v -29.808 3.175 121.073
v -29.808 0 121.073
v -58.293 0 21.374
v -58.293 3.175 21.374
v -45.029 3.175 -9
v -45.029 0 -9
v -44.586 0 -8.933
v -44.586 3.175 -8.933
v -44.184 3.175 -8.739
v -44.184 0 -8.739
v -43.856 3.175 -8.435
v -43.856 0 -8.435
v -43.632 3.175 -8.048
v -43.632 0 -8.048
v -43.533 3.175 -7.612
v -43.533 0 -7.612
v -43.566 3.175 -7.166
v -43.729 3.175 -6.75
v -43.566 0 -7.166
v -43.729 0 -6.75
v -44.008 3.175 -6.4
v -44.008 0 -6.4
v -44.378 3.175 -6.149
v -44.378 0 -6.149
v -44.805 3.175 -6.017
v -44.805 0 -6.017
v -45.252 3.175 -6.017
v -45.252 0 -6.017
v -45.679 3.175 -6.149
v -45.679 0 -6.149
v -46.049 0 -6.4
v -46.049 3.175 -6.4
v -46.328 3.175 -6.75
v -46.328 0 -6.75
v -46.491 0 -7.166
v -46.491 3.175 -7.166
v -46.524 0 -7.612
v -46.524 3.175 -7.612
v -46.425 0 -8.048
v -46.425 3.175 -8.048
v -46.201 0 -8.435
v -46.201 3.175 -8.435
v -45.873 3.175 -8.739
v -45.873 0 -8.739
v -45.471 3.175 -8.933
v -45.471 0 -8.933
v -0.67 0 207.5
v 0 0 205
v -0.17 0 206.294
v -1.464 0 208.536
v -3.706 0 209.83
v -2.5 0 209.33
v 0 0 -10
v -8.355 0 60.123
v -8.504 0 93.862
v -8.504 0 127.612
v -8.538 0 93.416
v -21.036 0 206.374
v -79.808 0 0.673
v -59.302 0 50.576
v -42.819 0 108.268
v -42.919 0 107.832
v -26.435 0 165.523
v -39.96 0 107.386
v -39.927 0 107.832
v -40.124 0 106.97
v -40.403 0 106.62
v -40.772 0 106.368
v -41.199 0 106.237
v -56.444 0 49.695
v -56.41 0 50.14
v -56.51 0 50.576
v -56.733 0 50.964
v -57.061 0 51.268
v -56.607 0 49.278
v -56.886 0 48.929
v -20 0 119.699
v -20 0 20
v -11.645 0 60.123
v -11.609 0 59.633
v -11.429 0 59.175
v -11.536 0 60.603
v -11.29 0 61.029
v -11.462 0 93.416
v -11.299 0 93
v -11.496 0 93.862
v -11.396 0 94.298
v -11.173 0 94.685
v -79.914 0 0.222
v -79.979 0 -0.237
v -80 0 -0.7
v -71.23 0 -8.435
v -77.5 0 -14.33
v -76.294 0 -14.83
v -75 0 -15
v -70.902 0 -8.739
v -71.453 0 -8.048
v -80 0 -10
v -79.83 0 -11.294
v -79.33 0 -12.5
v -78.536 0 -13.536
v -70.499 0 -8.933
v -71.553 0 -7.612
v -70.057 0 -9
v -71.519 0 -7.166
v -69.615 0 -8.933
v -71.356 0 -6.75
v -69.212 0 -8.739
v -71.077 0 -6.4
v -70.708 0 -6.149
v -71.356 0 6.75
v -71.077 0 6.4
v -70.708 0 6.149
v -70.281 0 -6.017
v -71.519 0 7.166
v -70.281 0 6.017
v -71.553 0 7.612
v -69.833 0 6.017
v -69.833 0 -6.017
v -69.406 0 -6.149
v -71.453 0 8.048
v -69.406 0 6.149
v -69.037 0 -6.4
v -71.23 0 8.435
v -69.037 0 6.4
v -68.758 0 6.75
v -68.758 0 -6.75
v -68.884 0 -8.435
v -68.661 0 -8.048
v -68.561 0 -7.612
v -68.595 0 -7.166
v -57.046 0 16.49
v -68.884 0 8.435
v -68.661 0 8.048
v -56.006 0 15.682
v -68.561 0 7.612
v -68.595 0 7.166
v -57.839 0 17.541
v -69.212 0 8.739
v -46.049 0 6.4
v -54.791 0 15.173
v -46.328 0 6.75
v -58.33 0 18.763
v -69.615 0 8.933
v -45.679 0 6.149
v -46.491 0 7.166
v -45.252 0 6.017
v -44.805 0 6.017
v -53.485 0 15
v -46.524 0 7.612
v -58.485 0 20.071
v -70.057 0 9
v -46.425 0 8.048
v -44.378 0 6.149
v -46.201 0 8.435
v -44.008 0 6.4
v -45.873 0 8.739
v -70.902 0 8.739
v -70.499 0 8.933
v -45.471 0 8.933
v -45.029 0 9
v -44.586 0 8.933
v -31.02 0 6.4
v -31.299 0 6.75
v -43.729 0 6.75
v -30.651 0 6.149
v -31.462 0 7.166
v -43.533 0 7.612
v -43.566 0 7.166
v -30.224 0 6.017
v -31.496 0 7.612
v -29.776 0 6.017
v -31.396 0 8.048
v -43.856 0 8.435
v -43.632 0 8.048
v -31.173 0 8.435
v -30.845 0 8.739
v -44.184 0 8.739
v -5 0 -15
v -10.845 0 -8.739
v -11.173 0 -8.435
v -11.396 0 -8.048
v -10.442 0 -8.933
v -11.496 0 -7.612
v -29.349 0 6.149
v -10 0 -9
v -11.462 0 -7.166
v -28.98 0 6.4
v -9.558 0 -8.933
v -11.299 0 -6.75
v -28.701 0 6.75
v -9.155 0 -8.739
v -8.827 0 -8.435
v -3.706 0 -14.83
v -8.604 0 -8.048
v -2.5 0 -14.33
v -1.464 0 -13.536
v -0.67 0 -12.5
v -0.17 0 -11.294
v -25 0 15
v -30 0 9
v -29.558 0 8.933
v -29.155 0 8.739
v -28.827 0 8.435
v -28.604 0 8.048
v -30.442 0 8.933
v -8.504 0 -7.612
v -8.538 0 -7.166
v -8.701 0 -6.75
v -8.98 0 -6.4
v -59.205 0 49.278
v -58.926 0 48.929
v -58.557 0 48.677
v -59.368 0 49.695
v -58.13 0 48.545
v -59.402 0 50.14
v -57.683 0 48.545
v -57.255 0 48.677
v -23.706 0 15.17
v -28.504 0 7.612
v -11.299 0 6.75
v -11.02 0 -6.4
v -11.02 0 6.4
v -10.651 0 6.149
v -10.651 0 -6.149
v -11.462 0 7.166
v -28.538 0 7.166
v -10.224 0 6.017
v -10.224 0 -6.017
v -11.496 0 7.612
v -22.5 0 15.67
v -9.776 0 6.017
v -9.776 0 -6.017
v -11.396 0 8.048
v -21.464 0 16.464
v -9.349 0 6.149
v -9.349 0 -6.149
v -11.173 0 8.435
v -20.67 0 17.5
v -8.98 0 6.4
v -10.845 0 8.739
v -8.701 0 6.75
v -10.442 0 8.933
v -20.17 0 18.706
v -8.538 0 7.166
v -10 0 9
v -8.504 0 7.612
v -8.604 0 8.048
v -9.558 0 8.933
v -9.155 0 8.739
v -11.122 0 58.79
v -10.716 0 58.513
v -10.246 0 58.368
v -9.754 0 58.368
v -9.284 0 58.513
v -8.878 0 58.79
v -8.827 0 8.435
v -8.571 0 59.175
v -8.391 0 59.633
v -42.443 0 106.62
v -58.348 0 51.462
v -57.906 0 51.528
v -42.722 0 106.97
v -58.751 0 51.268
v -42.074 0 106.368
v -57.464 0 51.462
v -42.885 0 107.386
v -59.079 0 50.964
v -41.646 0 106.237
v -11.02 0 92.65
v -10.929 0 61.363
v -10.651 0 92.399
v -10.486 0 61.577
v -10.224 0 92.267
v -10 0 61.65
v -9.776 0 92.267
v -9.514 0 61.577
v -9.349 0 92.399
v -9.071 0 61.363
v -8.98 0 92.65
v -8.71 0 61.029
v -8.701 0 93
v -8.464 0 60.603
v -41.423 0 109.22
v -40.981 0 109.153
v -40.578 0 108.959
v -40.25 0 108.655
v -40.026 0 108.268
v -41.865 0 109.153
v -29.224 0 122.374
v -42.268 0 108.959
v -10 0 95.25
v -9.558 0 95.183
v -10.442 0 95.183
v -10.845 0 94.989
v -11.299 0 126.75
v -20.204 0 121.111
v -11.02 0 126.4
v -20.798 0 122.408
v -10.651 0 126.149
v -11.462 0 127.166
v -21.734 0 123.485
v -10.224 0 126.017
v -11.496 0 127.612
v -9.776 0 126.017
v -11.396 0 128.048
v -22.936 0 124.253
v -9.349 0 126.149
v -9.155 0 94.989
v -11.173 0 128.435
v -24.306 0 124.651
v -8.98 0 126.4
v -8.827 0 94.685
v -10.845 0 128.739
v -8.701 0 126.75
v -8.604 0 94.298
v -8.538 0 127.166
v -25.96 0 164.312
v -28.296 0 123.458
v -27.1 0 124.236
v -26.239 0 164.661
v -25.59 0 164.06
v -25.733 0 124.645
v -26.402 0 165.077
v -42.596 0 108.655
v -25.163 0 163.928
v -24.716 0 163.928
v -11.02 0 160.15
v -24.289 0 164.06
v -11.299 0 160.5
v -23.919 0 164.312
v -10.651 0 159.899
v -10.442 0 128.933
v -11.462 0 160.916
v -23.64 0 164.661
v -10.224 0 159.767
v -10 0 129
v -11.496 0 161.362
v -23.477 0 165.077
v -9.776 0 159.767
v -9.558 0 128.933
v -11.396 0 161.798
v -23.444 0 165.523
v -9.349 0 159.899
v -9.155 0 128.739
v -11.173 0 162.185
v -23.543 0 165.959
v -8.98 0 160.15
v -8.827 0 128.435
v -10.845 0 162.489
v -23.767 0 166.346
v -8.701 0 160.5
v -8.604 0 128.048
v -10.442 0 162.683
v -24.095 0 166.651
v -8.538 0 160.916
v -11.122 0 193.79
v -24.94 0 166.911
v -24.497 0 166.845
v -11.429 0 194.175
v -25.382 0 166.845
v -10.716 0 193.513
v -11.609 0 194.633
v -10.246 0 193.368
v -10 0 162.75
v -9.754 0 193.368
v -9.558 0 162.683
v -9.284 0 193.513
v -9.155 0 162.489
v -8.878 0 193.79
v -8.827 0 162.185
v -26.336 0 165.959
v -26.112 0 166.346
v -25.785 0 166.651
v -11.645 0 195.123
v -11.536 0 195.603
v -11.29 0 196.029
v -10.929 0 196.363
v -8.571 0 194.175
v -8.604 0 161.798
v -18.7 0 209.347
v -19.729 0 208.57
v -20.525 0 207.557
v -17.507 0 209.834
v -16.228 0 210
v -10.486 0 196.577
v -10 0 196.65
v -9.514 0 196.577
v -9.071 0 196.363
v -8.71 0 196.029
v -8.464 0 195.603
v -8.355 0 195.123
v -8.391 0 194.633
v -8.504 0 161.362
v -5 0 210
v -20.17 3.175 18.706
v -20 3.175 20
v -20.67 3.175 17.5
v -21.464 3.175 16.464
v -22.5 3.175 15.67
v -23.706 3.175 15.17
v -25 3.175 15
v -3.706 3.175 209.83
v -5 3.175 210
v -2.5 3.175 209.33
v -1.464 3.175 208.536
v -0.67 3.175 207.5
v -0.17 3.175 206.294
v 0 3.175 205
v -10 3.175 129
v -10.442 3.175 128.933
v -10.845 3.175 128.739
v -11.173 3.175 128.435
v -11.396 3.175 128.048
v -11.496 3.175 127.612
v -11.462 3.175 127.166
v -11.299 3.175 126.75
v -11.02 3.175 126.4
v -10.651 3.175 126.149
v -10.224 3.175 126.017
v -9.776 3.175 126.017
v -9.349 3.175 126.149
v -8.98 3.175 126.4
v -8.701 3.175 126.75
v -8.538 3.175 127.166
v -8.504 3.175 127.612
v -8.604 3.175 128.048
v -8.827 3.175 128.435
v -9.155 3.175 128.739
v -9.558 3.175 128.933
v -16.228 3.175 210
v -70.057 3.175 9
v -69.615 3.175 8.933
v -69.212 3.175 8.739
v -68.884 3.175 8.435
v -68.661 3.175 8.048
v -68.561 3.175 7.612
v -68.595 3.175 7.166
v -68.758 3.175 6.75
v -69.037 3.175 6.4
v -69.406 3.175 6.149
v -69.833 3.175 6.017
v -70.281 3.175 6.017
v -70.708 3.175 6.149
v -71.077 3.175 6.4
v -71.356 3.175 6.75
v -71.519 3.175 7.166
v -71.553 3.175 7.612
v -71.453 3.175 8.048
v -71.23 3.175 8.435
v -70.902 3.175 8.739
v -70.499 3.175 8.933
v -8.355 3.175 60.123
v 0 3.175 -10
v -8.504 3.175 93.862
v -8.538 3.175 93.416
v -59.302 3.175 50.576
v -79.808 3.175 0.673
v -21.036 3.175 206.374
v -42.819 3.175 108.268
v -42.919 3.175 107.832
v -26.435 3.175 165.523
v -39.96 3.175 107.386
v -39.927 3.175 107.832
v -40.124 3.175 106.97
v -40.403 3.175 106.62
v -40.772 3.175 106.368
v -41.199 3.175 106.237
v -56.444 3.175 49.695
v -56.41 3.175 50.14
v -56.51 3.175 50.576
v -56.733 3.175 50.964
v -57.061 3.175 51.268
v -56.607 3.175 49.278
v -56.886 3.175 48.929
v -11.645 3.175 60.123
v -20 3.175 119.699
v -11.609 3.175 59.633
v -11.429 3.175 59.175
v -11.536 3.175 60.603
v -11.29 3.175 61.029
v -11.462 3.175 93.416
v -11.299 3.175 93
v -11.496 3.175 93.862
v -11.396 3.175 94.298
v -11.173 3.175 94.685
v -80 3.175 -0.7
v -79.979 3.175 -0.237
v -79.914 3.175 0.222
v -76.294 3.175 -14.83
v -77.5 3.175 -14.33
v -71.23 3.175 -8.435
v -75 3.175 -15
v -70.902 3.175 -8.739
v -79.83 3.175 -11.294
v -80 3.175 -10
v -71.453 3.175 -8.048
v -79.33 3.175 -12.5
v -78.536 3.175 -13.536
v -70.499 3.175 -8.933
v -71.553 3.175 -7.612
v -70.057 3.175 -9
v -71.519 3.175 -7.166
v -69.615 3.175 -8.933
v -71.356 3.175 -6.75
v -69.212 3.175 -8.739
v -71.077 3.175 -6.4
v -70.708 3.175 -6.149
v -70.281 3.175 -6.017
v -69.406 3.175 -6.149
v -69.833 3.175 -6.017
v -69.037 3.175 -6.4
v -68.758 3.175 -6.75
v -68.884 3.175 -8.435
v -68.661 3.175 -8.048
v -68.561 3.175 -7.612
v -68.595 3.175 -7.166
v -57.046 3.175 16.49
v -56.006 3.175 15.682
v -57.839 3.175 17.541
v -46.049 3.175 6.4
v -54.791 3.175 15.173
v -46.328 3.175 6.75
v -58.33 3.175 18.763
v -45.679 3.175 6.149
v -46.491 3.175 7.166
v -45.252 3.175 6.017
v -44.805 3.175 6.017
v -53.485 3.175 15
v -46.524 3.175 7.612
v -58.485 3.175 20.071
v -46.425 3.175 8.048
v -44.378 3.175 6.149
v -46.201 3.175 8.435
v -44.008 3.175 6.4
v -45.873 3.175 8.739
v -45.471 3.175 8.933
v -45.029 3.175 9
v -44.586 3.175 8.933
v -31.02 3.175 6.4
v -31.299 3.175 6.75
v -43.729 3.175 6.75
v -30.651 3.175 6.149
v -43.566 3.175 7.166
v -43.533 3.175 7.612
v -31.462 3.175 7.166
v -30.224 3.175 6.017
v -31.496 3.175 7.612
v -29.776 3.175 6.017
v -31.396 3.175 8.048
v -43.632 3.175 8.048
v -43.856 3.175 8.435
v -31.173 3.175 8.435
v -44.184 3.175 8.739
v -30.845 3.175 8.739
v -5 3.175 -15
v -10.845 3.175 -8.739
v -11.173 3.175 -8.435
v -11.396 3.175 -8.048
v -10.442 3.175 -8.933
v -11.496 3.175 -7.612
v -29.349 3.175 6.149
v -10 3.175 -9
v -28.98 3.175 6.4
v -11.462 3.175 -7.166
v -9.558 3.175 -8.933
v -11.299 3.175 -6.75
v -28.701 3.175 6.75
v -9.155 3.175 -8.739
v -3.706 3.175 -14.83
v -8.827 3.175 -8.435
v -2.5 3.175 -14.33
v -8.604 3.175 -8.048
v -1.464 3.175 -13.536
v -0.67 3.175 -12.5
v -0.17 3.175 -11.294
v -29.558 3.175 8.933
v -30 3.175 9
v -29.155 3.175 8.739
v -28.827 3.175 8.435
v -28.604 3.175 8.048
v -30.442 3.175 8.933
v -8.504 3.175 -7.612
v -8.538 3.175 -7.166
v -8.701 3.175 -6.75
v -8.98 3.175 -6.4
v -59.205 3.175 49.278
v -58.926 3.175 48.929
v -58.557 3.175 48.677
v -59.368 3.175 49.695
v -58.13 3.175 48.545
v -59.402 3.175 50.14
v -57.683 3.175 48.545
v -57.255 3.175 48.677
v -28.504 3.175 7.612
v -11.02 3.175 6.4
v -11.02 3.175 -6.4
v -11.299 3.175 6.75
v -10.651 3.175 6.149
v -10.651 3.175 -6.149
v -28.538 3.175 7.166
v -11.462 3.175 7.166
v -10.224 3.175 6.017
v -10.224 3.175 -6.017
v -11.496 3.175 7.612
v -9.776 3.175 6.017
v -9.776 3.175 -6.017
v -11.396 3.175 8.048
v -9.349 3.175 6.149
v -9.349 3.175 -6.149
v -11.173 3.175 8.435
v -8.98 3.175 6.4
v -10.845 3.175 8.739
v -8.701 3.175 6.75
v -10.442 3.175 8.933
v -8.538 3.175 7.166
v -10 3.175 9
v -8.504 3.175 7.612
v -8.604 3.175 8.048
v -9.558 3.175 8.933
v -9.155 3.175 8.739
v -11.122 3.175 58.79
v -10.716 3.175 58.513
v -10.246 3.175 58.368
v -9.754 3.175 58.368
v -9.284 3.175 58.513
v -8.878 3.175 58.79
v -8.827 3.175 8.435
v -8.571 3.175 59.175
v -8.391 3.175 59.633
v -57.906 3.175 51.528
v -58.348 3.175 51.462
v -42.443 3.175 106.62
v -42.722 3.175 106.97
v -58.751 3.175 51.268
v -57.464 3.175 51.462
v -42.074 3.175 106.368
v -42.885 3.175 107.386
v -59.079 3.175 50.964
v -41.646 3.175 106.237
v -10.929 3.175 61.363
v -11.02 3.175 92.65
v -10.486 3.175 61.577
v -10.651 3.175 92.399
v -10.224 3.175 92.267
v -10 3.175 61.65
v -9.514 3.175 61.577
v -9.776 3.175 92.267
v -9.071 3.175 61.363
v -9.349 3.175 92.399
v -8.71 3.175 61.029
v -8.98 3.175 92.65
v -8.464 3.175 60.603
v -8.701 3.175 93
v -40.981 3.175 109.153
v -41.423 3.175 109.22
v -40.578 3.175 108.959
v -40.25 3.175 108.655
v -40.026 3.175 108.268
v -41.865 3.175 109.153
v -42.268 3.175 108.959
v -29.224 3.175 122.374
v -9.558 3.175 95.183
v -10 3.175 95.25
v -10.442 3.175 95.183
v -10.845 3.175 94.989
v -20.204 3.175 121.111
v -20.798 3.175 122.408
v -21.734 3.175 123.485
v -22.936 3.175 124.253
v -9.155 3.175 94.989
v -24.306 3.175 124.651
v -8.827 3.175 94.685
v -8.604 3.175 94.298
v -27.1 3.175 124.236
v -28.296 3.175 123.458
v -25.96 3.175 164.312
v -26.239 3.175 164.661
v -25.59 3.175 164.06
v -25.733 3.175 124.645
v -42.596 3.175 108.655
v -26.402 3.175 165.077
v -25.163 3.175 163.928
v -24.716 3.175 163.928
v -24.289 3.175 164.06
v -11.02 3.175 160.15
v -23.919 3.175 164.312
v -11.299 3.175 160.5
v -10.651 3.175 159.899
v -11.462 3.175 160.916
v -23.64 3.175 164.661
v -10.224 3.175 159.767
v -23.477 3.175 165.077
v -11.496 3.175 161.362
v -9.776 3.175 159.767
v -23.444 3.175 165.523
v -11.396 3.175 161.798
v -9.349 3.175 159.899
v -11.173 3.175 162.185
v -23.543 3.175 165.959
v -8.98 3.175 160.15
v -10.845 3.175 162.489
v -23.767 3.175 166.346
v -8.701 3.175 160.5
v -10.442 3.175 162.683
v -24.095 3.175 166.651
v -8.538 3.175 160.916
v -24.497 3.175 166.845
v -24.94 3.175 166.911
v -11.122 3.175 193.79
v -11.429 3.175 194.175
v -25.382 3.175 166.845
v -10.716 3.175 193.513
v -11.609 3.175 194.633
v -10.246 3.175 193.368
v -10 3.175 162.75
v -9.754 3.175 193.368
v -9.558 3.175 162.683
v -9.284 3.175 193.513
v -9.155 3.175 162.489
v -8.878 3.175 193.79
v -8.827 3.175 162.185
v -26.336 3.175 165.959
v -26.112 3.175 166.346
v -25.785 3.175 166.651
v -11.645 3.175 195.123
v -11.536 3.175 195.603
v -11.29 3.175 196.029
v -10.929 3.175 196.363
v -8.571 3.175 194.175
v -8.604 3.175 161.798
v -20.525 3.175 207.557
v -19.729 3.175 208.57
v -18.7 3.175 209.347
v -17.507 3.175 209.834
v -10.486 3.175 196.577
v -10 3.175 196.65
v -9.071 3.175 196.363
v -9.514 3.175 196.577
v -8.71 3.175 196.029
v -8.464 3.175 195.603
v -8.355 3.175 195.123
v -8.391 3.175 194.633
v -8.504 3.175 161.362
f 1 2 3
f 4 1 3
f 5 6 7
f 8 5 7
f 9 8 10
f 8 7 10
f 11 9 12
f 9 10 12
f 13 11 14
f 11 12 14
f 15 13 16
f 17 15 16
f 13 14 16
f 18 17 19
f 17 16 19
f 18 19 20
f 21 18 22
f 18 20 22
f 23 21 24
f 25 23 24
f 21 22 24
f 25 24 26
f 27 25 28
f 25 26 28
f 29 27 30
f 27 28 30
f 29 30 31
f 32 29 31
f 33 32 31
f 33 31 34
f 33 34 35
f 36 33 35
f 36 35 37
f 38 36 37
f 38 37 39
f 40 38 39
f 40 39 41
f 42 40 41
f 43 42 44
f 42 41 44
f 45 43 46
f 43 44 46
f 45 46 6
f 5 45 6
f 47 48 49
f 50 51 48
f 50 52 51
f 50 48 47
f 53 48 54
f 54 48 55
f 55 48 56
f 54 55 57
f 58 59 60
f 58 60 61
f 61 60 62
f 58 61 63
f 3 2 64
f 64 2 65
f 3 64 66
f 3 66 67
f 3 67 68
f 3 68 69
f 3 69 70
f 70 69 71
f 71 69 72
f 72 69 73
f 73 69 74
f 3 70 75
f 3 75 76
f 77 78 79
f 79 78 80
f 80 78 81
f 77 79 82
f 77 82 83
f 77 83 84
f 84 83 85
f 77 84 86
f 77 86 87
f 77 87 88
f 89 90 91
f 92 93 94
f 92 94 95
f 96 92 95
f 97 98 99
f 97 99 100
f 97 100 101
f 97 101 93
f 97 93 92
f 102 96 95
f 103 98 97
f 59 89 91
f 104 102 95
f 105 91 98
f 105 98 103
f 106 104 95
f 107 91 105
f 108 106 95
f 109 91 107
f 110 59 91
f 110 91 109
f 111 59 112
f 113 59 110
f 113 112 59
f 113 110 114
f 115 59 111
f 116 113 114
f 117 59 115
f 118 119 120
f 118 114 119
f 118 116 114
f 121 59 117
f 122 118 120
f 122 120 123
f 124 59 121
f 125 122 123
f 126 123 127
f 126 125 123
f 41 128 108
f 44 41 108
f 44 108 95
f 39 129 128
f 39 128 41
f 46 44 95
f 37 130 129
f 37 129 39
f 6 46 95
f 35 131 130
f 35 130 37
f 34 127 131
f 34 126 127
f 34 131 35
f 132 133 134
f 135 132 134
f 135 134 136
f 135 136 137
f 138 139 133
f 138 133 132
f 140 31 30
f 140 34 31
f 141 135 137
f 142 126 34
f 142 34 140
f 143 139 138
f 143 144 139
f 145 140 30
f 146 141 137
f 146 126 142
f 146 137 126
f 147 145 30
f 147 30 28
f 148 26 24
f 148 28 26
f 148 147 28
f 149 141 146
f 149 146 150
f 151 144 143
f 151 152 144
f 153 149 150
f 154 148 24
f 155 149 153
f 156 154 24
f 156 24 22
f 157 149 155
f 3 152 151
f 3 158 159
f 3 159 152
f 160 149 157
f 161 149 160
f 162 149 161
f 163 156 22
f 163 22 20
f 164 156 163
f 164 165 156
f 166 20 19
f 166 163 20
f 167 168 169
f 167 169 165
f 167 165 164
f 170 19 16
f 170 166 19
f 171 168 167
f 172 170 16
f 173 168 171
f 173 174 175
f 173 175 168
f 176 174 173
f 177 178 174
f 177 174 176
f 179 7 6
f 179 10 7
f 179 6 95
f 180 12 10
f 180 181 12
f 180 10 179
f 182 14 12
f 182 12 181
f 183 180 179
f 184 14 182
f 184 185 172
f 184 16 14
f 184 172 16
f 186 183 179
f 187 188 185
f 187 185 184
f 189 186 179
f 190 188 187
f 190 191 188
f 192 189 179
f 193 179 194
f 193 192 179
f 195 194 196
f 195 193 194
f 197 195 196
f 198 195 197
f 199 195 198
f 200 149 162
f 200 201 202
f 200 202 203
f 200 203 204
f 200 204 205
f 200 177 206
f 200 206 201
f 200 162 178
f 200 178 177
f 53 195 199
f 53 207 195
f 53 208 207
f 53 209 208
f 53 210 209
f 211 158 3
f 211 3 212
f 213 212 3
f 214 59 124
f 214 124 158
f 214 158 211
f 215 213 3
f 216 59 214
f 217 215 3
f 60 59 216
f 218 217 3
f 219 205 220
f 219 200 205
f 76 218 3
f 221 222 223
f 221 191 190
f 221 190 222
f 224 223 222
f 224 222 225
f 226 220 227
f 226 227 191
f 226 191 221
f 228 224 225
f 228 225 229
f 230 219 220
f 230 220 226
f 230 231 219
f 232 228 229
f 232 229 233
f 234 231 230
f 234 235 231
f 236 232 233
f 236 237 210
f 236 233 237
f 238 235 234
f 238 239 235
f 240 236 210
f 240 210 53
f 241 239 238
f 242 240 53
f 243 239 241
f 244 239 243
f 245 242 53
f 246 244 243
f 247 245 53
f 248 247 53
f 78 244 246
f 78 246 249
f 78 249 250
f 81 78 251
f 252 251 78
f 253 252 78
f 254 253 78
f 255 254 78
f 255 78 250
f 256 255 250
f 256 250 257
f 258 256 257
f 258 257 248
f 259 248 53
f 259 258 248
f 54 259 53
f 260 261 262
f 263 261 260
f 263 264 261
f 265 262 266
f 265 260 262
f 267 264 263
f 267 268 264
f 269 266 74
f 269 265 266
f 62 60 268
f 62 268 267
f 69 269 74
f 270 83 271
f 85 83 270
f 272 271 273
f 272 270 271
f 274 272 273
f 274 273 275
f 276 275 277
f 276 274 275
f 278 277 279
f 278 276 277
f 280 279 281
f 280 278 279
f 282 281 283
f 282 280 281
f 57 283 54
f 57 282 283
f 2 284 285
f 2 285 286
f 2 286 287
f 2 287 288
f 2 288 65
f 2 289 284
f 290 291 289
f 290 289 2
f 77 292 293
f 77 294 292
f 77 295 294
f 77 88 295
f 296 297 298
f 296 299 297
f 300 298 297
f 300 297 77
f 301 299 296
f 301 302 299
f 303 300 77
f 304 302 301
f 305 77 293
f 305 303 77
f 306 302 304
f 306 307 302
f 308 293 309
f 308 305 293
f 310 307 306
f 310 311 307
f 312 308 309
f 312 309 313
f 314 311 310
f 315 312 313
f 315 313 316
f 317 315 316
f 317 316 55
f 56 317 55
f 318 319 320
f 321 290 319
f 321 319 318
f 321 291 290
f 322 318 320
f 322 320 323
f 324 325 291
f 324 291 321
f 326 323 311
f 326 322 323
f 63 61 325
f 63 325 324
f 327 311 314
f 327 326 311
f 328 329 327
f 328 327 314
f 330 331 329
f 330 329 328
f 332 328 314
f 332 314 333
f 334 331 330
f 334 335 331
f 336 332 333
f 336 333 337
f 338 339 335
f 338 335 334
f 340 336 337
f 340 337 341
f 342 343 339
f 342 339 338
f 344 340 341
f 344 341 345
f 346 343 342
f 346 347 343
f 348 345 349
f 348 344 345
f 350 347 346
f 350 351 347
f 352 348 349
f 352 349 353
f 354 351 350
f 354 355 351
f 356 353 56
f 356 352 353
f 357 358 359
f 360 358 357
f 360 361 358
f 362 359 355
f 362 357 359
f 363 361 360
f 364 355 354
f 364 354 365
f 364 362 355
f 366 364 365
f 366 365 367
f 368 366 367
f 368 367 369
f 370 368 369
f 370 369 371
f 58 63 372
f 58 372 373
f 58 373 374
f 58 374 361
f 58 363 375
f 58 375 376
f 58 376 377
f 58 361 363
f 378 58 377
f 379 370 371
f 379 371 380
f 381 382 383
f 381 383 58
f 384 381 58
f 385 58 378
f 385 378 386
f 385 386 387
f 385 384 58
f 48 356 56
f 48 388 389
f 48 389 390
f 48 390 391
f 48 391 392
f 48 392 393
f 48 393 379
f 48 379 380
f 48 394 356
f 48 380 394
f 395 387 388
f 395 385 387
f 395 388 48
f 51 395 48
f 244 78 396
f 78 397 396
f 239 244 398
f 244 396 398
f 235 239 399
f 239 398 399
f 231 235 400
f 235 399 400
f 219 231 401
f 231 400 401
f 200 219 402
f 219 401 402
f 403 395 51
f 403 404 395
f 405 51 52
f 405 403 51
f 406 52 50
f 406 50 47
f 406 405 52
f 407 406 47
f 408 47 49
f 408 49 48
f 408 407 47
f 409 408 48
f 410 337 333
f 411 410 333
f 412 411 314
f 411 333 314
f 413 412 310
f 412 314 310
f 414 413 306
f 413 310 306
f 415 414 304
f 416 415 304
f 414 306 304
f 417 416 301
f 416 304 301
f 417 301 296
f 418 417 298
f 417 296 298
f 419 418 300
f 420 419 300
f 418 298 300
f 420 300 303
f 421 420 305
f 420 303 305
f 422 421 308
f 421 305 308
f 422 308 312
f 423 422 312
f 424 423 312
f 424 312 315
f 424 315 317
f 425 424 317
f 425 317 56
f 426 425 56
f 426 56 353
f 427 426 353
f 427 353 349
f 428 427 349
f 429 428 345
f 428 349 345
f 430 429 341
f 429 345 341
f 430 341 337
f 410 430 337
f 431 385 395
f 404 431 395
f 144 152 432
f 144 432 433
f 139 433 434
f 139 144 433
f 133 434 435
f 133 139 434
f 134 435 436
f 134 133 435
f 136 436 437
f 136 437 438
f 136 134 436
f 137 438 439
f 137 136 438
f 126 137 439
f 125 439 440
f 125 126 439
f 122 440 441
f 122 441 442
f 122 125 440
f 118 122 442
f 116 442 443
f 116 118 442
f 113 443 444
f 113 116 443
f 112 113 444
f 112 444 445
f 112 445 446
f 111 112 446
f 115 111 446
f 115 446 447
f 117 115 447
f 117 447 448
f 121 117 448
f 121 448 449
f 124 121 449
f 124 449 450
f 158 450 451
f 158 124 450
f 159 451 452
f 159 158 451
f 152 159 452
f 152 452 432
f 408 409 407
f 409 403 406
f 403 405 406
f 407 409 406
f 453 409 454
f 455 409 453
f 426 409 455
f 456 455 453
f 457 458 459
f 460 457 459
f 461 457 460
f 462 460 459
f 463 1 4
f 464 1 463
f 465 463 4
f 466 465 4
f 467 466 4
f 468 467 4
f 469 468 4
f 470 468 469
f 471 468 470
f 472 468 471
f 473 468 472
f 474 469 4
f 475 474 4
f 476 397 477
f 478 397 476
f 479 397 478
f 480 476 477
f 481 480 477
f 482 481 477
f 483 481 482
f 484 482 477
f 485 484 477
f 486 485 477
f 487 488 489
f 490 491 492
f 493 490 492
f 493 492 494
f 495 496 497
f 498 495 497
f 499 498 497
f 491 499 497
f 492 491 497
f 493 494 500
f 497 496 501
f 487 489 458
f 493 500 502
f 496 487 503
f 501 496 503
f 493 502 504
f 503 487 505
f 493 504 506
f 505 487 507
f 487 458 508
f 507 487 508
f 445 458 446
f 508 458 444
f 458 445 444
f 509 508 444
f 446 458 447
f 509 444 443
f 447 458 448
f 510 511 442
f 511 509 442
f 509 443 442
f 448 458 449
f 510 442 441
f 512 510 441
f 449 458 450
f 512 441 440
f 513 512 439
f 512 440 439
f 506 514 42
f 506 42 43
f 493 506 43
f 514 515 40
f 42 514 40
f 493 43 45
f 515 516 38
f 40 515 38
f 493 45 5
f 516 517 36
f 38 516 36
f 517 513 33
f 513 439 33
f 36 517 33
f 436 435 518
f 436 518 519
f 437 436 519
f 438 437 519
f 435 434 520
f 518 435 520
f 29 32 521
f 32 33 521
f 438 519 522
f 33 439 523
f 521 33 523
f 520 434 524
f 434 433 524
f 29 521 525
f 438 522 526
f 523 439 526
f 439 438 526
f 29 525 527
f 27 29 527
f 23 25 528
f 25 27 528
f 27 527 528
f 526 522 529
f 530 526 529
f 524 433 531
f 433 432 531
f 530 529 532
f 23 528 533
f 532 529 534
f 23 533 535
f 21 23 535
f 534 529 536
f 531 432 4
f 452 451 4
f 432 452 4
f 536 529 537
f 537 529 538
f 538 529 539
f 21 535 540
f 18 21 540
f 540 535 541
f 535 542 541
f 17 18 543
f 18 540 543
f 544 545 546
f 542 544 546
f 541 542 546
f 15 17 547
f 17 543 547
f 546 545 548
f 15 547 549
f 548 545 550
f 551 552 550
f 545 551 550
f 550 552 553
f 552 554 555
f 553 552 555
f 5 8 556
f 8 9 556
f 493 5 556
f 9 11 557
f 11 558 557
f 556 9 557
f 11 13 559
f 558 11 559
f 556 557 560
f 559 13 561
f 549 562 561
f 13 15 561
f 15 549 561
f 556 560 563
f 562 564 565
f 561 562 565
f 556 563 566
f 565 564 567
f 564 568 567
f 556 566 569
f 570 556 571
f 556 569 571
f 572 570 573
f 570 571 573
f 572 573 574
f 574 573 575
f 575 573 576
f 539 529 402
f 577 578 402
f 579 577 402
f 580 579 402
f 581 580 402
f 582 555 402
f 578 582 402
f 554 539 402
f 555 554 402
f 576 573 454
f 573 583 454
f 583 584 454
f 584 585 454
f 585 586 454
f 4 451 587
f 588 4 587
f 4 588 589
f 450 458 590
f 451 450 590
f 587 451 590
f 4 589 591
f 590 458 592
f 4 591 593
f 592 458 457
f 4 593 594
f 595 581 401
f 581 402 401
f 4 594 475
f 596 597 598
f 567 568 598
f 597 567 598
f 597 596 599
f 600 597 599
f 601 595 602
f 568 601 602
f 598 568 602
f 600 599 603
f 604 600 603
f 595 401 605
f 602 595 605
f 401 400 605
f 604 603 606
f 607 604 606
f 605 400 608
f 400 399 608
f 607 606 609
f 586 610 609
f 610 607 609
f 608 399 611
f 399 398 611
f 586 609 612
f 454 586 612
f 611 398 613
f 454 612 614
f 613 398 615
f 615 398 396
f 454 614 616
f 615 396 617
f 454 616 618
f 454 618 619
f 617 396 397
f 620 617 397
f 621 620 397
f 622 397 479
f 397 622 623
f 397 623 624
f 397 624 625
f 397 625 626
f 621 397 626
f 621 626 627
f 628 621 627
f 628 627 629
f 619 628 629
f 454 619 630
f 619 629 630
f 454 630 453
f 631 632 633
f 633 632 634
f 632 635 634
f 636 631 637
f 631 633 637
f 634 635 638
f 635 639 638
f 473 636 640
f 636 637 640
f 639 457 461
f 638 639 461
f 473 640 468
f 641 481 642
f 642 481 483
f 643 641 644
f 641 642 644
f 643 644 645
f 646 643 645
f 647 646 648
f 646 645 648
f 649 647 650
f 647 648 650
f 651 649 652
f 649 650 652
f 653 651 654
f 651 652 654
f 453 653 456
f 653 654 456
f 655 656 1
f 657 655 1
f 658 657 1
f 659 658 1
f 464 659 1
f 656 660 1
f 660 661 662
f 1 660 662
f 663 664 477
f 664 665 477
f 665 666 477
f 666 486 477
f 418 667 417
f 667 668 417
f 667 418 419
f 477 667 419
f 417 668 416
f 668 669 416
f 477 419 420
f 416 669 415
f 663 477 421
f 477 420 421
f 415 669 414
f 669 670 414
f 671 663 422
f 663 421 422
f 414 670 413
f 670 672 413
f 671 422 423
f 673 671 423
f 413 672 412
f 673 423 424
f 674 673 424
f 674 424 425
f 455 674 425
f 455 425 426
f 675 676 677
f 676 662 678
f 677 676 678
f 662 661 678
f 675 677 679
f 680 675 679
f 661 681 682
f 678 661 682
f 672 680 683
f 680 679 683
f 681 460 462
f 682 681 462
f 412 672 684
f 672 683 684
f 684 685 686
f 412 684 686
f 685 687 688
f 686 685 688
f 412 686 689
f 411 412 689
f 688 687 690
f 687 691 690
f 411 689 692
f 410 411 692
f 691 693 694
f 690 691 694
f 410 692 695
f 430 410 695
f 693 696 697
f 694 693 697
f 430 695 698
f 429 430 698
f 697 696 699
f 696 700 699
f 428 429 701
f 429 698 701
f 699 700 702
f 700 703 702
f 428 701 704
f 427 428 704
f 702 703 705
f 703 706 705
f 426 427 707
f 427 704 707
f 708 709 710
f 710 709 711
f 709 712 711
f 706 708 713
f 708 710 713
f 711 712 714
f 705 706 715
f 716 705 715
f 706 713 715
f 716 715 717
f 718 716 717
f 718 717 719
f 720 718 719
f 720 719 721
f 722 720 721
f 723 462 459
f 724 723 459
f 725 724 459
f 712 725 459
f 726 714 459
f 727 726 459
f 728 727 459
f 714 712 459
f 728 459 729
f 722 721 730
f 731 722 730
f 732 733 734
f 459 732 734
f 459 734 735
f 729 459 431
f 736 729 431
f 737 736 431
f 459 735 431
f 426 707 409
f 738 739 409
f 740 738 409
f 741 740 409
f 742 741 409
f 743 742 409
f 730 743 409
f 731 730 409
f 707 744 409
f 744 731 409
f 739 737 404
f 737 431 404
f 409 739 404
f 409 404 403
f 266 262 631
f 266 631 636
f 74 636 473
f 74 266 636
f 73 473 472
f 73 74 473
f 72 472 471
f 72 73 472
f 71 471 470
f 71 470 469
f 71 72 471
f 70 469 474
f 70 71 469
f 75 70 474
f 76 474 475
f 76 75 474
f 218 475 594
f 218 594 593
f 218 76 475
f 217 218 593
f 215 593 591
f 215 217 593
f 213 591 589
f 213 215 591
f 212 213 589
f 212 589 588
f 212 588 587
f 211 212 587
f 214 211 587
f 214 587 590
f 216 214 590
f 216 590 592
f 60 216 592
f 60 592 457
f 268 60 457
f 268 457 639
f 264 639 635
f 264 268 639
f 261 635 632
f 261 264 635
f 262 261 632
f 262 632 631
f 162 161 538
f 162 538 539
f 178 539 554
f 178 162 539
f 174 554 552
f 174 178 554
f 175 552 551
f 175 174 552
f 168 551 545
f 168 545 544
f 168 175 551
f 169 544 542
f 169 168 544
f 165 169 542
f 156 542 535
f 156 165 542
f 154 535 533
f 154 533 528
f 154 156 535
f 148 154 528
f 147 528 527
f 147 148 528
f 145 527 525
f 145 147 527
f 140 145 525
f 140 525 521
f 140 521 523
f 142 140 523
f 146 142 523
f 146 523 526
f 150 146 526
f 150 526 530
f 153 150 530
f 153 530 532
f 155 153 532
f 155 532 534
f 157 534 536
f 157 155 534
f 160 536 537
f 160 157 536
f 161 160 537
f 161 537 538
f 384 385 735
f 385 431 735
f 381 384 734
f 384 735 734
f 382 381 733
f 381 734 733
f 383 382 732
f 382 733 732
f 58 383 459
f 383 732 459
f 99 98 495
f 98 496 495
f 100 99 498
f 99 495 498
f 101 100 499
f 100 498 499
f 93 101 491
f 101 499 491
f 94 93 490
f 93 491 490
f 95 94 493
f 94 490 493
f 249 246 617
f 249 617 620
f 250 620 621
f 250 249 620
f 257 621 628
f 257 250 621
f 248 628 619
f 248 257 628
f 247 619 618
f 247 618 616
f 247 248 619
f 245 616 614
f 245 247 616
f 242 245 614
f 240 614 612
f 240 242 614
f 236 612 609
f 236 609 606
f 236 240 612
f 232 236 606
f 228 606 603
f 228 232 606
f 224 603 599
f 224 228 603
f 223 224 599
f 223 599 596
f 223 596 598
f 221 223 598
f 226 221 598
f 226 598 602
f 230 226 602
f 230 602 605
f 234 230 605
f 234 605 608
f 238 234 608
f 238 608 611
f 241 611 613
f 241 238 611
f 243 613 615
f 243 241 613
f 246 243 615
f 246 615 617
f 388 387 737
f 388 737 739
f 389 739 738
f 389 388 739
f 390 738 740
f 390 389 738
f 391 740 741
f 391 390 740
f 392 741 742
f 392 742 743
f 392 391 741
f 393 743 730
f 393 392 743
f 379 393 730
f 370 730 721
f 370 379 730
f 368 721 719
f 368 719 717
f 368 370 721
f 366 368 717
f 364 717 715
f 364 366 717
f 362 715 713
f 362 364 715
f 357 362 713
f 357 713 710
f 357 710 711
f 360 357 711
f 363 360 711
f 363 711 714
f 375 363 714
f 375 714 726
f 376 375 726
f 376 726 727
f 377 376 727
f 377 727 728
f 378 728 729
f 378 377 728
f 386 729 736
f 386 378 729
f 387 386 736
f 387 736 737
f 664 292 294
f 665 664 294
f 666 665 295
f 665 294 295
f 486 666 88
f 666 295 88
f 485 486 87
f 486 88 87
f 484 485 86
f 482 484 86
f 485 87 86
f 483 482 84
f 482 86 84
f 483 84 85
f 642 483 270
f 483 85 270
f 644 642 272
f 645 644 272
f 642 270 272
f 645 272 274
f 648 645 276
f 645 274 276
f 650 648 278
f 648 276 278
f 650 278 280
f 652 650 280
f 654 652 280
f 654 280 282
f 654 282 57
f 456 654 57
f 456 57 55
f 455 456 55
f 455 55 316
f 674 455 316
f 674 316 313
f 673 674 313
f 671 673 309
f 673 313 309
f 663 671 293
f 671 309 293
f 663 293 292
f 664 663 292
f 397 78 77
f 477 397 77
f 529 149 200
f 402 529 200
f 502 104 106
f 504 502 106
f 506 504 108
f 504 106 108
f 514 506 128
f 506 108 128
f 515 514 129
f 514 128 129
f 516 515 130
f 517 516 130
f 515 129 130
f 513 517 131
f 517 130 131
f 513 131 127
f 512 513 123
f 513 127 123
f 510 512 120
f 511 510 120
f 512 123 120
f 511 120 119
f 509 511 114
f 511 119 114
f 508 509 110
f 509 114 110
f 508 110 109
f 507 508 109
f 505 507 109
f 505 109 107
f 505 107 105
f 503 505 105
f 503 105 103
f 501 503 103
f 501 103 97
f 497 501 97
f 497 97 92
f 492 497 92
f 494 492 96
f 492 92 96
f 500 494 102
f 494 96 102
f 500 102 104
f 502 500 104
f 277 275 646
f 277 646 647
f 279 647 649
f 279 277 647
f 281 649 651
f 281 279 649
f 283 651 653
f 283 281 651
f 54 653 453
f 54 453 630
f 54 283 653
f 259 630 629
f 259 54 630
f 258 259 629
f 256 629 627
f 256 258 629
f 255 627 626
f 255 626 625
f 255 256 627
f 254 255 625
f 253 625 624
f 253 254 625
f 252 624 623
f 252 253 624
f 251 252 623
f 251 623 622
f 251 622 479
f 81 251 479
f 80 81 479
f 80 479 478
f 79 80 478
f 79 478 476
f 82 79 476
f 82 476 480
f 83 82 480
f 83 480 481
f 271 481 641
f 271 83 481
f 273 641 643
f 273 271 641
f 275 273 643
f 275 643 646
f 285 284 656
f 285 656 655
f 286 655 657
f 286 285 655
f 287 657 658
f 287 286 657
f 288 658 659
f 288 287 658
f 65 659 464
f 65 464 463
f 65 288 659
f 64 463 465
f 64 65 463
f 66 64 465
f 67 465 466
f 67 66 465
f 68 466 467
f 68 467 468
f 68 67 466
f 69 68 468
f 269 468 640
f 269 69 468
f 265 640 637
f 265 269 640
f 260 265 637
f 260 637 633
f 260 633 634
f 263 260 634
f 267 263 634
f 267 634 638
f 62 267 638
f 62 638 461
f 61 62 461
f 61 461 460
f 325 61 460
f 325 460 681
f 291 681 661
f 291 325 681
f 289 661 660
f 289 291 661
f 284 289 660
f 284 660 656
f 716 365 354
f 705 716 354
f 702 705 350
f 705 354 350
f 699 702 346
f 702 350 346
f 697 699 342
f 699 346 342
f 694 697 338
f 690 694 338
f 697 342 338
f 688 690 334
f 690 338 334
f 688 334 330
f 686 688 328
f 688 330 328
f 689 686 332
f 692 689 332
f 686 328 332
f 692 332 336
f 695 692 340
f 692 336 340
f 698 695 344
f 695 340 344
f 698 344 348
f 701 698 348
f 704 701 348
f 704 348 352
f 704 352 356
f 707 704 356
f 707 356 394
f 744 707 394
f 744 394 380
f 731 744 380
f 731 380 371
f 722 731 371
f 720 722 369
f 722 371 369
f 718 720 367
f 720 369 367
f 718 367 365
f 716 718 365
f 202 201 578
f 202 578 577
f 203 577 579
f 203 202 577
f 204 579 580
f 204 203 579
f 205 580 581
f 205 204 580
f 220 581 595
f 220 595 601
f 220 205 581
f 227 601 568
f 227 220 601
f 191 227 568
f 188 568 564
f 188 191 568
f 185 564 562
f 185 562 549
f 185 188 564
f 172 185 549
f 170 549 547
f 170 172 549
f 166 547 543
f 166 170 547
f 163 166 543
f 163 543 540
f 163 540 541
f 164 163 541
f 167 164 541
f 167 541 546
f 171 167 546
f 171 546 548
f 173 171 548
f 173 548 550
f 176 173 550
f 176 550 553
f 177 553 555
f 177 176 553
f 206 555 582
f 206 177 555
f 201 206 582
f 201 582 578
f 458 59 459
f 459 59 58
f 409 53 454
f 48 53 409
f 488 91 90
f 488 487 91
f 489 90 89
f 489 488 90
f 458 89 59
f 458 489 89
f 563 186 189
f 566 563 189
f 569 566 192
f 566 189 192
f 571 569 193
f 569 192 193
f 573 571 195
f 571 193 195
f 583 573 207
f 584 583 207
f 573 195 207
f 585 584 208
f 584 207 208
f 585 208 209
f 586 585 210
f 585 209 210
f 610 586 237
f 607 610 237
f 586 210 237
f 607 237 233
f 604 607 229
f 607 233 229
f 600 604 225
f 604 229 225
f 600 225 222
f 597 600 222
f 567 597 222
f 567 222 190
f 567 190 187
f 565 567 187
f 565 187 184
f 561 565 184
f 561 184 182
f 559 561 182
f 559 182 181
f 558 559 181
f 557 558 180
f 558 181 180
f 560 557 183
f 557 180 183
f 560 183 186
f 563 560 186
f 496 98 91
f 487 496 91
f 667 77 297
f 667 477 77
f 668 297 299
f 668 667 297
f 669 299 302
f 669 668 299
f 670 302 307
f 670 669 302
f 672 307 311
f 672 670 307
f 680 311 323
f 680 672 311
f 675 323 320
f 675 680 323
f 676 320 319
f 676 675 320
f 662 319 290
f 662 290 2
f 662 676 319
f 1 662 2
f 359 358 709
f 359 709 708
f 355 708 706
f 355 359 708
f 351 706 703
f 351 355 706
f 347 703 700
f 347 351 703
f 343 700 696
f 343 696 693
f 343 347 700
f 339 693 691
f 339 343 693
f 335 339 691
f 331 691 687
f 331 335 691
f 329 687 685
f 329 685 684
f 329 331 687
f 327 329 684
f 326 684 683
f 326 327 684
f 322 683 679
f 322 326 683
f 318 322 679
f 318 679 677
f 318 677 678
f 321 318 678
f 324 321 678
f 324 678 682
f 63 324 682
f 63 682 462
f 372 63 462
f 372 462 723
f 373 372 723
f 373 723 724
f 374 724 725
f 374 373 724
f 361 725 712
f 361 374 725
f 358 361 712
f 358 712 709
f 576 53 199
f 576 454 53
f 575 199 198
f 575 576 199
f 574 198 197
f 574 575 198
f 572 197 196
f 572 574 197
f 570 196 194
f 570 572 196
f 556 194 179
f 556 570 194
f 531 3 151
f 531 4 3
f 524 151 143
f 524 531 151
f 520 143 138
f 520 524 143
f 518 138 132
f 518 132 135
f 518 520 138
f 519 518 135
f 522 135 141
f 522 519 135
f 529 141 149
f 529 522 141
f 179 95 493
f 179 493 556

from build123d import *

# Parameters (mm, degrees)
SKETCH1_R           = 1.5
SKETCH1_R_2         = 1.65
BOSS_EXTRUDE1_DEPTH = 3.175
SKETCH2_W           = 80
SKETCH2_H           = 15
SKETCH2_R           = 1.5
BOSS_EXTRUDE2_DEPTH = 3.175
FILLET1_R           = 5


with BuildPart() as part:
    # Sketch1 → Boss-Extrude1 (new body)
    with BuildSketch(Plane(origin=(0, 0, 0), x_dir=(1, 0, 0), z_dir=(0, 1, 0))):
        Polygon((-20, -210), (0, -210), (0, 0), (-80, 0), align=None)
        with Locations(Location((-41.422797756, -107.71979577, 0), (0, 0, 270))):
            Circle(SKETCH1_R, mode=Mode.SUBTRACT)
        with Locations(Location((-24.939530082, -165.411232629, 0), (0, 0, 270))):
            Circle(SKETCH1_R, mode=Mode.SUBTRACT)
        with Locations(Location((-10, -195, 0), (0, 0, 270))):
            Circle(SKETCH1_R_2, mode=Mode.SUBTRACT)
        with BuildLine():
            ThreePointArc((-10, -159.75), (-8.5, -161.25), (-10, -162.75))
            ThreePointArc((-10, -162.75), (-11.5, -161.25), (-10, -159.75))
        make_face(mode=Mode.SUBTRACT)
        with BuildLine():
            ThreePointArc((-10, -126), (-8.5, -127.5), (-10, -129))
            ThreePointArc((-10, -129), (-11.5, -127.5), (-10, -126))
        make_face(mode=Mode.SUBTRACT)
        Polygon((-20, -15), (-20, -155.39917583), (-60.114050237, -15), align=None, mode=Mode.SUBTRACT)
        with Locations(Location((-57.90606543, -50.028358912, 0), (0, 0, 270))):
            Circle(SKETCH1_R, mode=Mode.SUBTRACT)
        with Locations(Location((-70.057025119, -7.5, 0), (0, 0, 270))):
            Circle(SKETCH1_R, mode=Mode.SUBTRACT)
        with Locations(Location((-45.028512559, -7.5, 0), (0, 0, 270))):
            Circle(SKETCH1_R, mode=Mode.SUBTRACT)
        with BuildLine():
            ThreePointArc((-10, -92.25), (-8.5, -93.75), (-10, -95.25))
            ThreePointArc((-10, -95.25), (-11.5, -93.75), (-10, -92.25))
        make_face(mode=Mode.SUBTRACT)
        with Locations(Location((-10, -60, 0), (0, 0, 270))):
            Circle(SKETCH1_R_2, mode=Mode.SUBTRACT)
        with Locations(Location((-30, -7.5, 0), (0, 0, 270))):
            Circle(SKETCH1_R, mode=Mode.SUBTRACT)
        with Locations(Location((-10, -7.5, 0), (0, 0, 270))):
            Circle(SKETCH1_R, mode=Mode.SUBTRACT)
    extrude(amount=BOSS_EXTRUDE1_DEPTH)

    # Sketch2 → Boss-Extrude2 (add)
    with BuildSketch(Plane.XZ):
        with Locations((-40, -7.5)):
            Rectangle(SKETCH2_W, SKETCH2_H)
        with Locations(Location((-70.057025119, -7.5, 0), (0, 0, 270))):
            Circle(SKETCH2_R, mode=Mode.SUBTRACT)
        with Locations(Location((-45.028512559, -7.5, 0), (0, 0, 270))):
            Circle(SKETCH2_R, mode=Mode.SUBTRACT)
        with Locations(Location((-10, -7.5, 0), (0, 0, 270))):
            Circle(SKETCH2_R, mode=Mode.SUBTRACT)
    extrude(amount=-BOSS_EXTRUDE2_DEPTH)

    # Fillet1
    fillet1_edges = [part.edges().sort_by_distance(p)[0] for p in [
        (-80, 1.5875, 0),
        (0, 1.5875, 210),
        (-20, 1.5875, 210),
        (-20, 1.5875, 15),
        (-60.114050237, 1.5875, 15),
        (-20, 1.5875, 155.39917583),
        (0, 1.5875, -15),
        (-80, 1.5875, -15),
    ]]
    fillet(fillet1_edges, radius=FILLET1_R)


solid = part.part
